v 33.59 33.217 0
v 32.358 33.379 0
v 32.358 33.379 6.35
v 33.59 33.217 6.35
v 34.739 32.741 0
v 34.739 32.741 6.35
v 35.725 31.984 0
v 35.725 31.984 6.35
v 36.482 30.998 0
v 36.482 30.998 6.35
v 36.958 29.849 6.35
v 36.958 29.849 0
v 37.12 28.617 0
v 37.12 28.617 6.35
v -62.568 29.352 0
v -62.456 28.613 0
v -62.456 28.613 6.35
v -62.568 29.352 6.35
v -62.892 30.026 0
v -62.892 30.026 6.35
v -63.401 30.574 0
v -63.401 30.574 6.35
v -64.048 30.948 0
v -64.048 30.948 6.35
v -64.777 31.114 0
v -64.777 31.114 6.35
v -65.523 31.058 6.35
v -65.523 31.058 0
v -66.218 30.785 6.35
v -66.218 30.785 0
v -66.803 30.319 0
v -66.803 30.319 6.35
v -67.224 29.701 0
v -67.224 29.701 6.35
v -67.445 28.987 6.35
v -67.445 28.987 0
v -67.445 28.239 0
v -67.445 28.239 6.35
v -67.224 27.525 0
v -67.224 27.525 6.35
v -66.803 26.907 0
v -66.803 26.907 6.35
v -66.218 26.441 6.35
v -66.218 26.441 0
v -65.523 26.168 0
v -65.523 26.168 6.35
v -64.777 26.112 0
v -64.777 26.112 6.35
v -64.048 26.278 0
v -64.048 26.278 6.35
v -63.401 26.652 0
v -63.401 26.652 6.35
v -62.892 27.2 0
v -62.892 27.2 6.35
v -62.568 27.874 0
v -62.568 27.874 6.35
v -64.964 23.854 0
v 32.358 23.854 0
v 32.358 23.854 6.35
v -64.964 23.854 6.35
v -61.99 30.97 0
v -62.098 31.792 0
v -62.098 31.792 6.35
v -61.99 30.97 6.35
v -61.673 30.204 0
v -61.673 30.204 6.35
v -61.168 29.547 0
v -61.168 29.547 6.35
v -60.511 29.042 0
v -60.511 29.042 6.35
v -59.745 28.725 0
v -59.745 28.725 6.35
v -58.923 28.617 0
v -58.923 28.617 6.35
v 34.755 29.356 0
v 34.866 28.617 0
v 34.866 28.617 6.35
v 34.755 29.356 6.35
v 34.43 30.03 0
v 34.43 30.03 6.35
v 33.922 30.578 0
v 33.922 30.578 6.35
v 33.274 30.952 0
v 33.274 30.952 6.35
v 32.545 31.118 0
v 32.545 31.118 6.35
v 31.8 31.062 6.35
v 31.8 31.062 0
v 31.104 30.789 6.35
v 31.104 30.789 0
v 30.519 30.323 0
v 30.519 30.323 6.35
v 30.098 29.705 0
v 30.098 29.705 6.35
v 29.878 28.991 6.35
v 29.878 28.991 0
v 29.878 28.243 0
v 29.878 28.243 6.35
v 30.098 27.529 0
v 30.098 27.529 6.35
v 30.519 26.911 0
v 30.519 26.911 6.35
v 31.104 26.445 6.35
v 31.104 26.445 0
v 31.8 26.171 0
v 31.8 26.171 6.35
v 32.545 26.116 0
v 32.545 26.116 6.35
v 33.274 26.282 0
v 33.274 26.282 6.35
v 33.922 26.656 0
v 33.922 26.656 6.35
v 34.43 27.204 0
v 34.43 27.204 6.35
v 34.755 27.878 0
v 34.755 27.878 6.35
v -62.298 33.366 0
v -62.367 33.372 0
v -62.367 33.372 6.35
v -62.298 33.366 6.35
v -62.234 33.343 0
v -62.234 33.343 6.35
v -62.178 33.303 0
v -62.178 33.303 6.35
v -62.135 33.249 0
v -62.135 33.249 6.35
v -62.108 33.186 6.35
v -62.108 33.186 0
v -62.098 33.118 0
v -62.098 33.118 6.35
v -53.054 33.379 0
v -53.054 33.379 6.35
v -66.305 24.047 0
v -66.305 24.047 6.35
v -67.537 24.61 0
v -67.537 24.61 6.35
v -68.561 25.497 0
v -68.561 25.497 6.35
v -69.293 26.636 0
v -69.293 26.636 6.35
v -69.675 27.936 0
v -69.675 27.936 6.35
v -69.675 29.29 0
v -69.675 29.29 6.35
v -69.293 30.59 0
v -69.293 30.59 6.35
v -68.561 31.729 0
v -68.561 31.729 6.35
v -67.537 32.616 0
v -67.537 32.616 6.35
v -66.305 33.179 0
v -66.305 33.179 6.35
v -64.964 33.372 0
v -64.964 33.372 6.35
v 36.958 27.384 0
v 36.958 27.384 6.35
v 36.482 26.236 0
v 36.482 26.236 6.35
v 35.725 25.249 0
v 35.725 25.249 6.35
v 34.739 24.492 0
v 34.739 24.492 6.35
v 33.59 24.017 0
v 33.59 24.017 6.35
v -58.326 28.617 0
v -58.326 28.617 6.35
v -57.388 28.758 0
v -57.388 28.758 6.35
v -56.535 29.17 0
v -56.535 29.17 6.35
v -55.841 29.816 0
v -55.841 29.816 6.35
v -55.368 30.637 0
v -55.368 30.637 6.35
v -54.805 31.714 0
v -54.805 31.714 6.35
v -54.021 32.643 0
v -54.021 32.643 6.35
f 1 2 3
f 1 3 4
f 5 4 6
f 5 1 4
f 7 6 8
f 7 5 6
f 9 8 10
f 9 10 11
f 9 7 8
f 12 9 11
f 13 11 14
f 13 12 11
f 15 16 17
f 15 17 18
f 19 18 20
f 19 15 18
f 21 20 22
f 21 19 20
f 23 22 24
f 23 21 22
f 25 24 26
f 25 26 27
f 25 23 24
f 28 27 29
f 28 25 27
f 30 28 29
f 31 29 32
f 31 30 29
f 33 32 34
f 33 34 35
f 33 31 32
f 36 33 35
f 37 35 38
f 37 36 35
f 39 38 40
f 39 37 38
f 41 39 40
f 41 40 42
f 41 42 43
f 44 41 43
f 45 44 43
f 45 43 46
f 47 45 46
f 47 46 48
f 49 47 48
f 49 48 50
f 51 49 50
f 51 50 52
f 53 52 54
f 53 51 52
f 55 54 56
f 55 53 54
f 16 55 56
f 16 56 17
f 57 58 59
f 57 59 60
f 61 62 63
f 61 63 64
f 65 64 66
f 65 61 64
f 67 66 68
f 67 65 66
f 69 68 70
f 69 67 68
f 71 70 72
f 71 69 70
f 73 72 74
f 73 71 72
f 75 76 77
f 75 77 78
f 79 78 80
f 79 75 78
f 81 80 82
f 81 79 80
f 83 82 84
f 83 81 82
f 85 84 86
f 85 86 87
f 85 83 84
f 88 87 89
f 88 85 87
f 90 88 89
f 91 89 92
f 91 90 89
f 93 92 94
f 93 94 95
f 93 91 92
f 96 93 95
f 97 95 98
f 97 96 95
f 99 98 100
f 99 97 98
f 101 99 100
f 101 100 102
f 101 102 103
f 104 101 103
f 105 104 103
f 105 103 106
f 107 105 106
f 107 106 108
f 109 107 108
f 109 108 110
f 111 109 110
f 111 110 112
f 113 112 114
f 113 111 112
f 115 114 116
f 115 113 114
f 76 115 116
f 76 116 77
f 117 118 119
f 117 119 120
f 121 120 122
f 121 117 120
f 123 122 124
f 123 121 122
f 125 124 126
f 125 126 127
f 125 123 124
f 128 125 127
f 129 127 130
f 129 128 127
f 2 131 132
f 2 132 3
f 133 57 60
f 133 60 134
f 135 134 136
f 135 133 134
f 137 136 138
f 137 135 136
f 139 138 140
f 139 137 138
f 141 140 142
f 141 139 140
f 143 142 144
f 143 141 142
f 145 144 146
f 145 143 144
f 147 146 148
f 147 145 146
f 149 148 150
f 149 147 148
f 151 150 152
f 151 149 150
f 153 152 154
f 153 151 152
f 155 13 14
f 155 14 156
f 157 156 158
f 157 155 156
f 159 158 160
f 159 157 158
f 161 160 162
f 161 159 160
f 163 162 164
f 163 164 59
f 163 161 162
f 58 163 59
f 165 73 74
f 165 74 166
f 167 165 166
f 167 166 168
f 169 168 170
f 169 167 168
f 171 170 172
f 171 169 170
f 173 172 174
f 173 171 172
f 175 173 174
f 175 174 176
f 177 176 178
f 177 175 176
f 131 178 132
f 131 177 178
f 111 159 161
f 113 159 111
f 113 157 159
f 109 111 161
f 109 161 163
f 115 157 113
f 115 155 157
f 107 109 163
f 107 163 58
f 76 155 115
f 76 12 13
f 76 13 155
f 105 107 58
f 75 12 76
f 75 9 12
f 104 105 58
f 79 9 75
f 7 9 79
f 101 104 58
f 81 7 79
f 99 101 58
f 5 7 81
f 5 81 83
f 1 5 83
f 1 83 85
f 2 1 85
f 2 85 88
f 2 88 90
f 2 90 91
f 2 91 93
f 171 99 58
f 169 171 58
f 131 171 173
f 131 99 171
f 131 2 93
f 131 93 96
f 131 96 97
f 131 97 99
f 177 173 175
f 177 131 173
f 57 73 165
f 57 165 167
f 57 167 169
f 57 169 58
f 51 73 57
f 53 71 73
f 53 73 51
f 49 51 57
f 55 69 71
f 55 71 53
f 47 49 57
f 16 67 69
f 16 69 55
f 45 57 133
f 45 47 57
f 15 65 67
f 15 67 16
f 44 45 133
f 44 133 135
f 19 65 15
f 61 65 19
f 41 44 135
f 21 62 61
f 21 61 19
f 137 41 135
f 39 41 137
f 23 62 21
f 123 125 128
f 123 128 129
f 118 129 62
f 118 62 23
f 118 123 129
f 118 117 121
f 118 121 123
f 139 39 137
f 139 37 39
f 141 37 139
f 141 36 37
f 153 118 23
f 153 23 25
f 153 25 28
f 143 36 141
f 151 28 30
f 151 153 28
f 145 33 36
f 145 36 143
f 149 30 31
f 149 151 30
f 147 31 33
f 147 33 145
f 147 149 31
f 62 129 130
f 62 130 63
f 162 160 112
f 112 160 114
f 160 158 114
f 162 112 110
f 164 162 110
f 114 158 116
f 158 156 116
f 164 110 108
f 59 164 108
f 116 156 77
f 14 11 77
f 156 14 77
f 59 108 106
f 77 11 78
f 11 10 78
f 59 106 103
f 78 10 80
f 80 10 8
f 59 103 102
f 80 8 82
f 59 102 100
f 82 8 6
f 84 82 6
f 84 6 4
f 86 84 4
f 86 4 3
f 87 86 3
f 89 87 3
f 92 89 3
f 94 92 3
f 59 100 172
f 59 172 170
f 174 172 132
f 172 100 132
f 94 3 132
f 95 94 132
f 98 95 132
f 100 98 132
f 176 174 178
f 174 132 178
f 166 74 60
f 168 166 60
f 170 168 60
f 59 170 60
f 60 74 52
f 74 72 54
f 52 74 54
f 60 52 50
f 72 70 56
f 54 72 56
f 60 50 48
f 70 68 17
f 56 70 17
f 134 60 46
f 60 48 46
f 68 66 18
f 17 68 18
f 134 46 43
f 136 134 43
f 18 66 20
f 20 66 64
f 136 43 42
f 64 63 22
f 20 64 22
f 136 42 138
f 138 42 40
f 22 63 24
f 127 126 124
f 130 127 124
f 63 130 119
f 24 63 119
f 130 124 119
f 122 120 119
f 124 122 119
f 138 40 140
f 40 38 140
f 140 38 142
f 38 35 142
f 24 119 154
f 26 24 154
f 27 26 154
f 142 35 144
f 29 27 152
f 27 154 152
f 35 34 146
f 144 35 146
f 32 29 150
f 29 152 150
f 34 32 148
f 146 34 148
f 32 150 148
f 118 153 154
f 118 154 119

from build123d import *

# Parameters (mm, degrees)
SKETCH1_R           = 2.50825
BOSS_EXTRUDE1_DEPTH = 6.35


with BuildPart() as part:
    # Sketch1 → Boss-Extrude1 (new body)
    with BuildSketch(Plane.XY):
        with BuildLine():
            Line((-62.098423071, 33.11819072), (-62.098423071, 31.791851336))
            ThreePointArc((-62.098423071, 31.791851336), (-61.168487101, 29.546787305), (-58.923423071, 28.616851336))
            Line((-58.923423071, 28.616851336), (-58.325690241, 28.616851336))
            ThreePointArc((-58.325690241, 28.616851336), (-56.534748704, 29.17018137), (-55.368047634, 30.637305881))
            ThreePointArc((-55.368047634, 30.637305881), (-54.438487204, 32.200247817), (-53.054079396, 33.379351336))
            Line((-53.054079396, 33.379351336), (32.357826929, 33.379351336))
            ThreePointArc((32.357826929, 33.379351336), (35.725422975, 31.984447381), (37.120326929, 28.616851336))
            ThreePointArc((37.120326929, 28.616851336), (35.725422975, 25.24925529), (32.357826929, 23.854351336))
            Line((32.357826929, 23.854351336), (-64.964369517, 23.854351336))
            ThreePointArc((-64.964369517, 23.854351336), (-69.723087501, 28.61306932), (-64.964369517, 33.371787305))
            Line((-64.964369517, 33.371787305), (-62.36673293, 33.371787305))
            ThreePointArc((-62.36673293, 33.371787305), (-62.177950586, 33.302785823), (-62.098423071, 33.11819072))
        make_face()
        with Locations((32.357826929, 28.616851336)):
            Circle(SKETCH1_R, mode=Mode.SUBTRACT)
        with Locations((-64.964369517, 28.61306932)):
            Circle(SKETCH1_R, mode=Mode.SUBTRACT)
    extrude(amount=BOSS_EXTRUDE1_DEPTH)


solid = part.part
